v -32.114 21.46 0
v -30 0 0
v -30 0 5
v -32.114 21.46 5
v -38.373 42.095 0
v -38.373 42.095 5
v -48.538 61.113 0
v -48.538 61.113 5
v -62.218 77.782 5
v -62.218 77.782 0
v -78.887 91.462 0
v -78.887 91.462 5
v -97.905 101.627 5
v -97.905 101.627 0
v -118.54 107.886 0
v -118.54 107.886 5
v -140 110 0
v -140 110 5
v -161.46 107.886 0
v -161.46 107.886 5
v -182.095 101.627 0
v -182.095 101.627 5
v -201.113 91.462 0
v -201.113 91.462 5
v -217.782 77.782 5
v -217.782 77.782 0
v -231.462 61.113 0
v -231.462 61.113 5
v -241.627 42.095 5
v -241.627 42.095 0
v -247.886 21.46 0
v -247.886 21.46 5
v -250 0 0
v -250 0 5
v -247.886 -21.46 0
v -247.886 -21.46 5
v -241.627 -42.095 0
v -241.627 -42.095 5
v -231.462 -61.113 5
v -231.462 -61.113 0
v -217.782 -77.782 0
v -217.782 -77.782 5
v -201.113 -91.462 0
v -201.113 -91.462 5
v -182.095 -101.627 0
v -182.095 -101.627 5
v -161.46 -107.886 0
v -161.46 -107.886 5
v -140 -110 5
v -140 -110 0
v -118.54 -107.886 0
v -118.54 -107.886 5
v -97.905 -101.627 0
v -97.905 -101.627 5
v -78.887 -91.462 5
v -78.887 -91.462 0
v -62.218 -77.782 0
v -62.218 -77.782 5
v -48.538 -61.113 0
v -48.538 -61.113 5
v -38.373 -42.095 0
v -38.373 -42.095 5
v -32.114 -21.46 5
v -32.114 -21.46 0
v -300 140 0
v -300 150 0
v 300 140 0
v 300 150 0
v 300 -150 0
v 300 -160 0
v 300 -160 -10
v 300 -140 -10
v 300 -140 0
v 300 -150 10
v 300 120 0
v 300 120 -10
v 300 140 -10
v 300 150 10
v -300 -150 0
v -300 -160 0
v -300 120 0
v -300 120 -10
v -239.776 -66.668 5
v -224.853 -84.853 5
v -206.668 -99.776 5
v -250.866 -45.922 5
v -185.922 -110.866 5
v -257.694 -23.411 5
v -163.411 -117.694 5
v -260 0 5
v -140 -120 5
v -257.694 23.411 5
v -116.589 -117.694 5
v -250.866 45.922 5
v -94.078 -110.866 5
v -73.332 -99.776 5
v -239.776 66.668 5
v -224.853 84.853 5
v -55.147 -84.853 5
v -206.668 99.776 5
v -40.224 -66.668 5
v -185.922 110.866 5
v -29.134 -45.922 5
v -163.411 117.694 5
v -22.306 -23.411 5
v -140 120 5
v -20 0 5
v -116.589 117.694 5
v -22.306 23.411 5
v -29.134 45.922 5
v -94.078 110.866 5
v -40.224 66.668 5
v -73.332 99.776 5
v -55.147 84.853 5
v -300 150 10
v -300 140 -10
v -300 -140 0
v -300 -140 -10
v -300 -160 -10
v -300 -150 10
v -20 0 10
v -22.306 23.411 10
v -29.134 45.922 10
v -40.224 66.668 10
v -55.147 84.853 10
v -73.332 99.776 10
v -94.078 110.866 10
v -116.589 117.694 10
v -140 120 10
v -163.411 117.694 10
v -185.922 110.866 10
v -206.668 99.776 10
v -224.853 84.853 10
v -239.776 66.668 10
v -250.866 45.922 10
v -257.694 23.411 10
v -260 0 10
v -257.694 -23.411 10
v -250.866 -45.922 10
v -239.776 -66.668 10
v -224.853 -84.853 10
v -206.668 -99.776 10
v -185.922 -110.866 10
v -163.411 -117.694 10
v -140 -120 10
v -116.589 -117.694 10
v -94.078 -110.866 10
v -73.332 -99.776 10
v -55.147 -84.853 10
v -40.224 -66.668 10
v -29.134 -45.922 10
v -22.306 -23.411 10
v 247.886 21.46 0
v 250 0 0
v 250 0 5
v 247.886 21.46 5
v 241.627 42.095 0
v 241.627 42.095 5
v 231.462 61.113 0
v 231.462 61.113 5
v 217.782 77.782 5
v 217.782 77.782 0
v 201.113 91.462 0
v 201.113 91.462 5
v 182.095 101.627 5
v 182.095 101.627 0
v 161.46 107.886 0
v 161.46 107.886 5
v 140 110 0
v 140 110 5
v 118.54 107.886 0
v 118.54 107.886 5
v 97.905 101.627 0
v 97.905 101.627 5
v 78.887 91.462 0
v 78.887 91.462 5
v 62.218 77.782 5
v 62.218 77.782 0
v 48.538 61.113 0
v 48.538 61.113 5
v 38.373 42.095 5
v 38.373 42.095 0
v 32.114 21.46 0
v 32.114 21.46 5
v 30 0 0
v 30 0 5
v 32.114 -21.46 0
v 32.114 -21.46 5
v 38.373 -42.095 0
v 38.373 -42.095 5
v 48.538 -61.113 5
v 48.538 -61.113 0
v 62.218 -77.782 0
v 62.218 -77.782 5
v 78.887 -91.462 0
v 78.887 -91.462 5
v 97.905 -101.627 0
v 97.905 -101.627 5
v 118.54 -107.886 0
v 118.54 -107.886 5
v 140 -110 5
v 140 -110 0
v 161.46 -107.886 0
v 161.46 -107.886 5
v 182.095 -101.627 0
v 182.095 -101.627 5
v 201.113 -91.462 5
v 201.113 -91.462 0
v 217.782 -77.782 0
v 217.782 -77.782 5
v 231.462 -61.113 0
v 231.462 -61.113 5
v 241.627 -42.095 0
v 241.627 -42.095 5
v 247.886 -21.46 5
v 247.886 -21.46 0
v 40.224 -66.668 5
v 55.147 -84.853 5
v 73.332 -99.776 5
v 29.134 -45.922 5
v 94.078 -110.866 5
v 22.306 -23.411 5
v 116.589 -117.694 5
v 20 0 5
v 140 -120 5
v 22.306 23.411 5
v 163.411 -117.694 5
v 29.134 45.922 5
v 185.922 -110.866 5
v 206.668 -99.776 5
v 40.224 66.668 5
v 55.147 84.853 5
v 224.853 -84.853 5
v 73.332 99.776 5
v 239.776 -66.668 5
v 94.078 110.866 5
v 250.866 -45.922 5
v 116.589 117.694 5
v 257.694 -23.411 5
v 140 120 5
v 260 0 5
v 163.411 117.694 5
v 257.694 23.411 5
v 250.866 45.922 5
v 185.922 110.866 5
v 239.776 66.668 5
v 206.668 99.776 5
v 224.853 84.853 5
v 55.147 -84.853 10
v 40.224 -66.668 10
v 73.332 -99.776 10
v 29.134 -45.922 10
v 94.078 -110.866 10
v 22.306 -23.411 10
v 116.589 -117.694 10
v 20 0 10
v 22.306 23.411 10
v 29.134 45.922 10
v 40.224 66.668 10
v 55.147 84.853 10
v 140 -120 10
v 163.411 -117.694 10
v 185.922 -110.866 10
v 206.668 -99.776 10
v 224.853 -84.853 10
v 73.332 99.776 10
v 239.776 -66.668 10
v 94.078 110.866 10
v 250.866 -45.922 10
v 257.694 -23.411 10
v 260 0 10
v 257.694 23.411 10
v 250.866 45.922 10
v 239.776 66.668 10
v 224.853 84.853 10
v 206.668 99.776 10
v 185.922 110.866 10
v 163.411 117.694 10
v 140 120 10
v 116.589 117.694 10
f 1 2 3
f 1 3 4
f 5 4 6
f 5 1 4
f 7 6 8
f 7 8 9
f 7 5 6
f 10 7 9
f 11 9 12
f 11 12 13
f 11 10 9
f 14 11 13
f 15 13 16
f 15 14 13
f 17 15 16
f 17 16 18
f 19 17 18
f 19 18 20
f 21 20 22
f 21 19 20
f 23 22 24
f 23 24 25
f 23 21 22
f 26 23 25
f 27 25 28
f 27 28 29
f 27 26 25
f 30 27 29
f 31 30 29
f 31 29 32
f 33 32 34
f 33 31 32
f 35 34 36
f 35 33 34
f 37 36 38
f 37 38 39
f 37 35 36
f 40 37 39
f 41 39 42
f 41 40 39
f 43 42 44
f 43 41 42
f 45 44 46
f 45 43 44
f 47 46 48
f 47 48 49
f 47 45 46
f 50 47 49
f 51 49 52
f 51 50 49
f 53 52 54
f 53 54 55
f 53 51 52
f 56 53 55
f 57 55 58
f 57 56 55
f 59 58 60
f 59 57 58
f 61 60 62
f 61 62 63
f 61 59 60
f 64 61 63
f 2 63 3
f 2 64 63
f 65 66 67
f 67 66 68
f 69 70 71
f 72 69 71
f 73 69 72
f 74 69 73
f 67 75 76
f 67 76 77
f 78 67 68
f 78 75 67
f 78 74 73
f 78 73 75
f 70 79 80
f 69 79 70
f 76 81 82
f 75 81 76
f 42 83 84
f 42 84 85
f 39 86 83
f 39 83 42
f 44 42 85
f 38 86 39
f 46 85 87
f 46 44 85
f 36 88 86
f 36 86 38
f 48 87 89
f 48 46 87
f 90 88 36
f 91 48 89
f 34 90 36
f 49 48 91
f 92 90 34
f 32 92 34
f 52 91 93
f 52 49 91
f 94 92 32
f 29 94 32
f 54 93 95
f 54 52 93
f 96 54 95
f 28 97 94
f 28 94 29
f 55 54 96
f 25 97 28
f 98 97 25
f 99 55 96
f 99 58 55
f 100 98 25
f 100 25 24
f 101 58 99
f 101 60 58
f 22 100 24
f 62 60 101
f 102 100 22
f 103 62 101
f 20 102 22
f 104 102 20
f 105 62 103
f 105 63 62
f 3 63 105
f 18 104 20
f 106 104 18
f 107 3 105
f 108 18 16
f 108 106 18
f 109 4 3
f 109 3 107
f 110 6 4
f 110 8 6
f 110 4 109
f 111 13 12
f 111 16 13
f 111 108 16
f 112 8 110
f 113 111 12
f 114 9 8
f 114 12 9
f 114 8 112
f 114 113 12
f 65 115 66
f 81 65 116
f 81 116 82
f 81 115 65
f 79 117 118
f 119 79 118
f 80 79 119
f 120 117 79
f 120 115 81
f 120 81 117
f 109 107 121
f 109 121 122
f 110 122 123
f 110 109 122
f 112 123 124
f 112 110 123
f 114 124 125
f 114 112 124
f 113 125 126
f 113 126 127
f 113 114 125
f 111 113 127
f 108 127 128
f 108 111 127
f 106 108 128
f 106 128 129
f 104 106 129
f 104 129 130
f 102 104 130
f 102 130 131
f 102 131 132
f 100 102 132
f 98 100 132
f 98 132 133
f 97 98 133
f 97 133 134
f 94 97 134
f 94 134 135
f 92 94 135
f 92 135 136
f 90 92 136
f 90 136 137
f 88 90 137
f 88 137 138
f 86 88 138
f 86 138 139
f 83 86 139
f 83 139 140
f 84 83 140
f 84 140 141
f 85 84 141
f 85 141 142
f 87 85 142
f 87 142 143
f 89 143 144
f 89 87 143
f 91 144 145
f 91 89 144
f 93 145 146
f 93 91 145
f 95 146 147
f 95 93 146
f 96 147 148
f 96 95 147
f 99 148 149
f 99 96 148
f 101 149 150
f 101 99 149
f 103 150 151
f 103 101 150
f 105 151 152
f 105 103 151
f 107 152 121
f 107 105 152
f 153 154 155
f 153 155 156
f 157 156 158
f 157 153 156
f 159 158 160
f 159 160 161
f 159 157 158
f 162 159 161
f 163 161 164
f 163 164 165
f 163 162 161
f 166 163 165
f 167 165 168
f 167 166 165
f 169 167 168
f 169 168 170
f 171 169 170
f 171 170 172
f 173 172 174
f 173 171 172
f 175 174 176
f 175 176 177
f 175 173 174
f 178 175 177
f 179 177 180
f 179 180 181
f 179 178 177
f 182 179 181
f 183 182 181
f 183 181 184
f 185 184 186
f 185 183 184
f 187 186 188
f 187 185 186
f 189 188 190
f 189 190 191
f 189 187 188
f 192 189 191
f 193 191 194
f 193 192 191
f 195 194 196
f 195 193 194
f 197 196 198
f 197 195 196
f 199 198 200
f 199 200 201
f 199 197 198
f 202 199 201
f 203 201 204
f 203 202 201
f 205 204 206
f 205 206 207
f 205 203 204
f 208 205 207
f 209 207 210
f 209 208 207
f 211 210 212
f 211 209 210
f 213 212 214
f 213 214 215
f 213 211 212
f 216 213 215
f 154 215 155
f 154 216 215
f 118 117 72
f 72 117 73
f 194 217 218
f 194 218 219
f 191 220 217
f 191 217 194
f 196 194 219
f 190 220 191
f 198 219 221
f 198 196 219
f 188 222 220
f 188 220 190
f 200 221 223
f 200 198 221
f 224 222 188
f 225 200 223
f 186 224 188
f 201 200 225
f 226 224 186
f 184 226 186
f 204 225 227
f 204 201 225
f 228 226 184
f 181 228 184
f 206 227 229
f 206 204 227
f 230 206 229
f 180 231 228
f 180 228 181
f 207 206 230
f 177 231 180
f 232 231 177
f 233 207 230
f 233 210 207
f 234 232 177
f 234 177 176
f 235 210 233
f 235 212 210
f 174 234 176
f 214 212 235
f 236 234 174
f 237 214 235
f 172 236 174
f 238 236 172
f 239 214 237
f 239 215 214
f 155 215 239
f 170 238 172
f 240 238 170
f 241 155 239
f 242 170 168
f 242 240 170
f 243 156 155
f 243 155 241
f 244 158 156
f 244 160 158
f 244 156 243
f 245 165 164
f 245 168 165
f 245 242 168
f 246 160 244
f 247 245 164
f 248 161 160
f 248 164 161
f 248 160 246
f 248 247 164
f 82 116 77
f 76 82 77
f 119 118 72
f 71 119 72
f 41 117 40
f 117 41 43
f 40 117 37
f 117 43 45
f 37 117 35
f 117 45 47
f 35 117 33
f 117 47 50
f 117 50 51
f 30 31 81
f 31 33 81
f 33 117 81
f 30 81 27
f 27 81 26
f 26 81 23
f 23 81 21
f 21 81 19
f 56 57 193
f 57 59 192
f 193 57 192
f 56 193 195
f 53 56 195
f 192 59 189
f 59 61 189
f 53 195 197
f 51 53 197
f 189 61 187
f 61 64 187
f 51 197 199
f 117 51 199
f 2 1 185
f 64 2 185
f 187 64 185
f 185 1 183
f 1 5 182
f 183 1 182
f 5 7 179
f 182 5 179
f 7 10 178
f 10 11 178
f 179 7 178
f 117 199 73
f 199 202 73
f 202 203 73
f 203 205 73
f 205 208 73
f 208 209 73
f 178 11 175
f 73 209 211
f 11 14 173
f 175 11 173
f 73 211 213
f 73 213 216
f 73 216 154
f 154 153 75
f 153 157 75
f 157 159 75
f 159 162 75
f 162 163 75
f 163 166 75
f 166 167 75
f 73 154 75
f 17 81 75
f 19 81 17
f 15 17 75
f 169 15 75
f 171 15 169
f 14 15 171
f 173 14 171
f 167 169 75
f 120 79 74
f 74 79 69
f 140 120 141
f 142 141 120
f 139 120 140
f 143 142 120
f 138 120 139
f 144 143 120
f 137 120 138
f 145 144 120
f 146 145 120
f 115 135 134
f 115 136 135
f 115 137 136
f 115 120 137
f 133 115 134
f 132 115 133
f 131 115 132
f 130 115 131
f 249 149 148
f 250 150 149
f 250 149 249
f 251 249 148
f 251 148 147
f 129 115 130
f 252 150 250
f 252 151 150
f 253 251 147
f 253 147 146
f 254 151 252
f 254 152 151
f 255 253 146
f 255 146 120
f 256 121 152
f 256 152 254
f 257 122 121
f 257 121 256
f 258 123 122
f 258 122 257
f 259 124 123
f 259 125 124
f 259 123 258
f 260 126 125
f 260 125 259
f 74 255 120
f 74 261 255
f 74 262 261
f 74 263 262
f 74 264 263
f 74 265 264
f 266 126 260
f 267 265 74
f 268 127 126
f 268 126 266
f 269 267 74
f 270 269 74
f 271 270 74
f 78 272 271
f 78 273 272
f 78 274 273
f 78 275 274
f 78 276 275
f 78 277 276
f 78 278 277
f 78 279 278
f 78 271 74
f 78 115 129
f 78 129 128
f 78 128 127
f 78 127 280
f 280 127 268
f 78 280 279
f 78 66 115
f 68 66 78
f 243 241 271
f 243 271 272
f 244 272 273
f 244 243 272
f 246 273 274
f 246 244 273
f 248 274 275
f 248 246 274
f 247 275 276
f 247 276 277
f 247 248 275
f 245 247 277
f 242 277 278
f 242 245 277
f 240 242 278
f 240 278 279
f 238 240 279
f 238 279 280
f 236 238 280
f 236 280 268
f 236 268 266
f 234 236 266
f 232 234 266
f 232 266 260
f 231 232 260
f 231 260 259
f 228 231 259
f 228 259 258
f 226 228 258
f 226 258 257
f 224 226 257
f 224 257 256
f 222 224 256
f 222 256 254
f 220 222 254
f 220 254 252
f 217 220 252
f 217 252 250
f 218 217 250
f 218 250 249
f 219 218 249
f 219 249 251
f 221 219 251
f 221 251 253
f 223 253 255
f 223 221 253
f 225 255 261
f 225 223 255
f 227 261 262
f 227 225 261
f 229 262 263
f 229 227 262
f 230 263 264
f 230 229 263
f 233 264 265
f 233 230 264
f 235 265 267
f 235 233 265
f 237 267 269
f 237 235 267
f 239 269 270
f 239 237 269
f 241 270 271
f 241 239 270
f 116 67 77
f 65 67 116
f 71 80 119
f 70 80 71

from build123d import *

# Parameters (mm, degrees)
F0_W     = 600
F0_H     = 300
F0_R     = 120
F1_DEPTH = 10
F0_R_2   = 110
F2_DEPTH = 5
F3_W     = 600
F3_H     = 10
F4_DEPTH = 10


with BuildPart() as f1:
    # F0 (on Top) → F1 (new body)
    with BuildSketch(Plane.XY):
        Rectangle(F0_W, F0_H)
        with Locations((-140, 0)):
            Circle(F0_R, mode=Mode.SUBTRACT)
        with Locations((140, 0)):
            Circle(F0_R, mode=Mode.SUBTRACT)
    extrude(amount=F1_DEPTH)

    # F0 (on Top) → F2 (join)
    with BuildSketch(Plane.XY):
        with Locations((-140, 0)):
            Circle(F0_R)
        with Locations((-140, 0)):
            Circle(F0_R_2, mode=Mode.SUBTRACT)
        with Locations((140, 0)):
            Circle(F0_R)
        with Locations((140, 0)):
            Circle(F0_R_2, mode=Mode.SUBTRACT)
    extrude(amount=F2_DEPTH)

    # F3 (on face) → F4 (join)
    with BuildSketch(Plane.XY):
        with Locations((0, -145)):
            Rectangle(F3_W, F3_H)
        with Locations((0, -155)):
            Rectangle(F3_W, F3_H)
        Polygon((300, 140), (-300, 140), (-300, 120), (-140, 120), (140, 120), (300, 120), align=None)
    extrude(amount=-F4_DEPTH)


solid = f1.part
